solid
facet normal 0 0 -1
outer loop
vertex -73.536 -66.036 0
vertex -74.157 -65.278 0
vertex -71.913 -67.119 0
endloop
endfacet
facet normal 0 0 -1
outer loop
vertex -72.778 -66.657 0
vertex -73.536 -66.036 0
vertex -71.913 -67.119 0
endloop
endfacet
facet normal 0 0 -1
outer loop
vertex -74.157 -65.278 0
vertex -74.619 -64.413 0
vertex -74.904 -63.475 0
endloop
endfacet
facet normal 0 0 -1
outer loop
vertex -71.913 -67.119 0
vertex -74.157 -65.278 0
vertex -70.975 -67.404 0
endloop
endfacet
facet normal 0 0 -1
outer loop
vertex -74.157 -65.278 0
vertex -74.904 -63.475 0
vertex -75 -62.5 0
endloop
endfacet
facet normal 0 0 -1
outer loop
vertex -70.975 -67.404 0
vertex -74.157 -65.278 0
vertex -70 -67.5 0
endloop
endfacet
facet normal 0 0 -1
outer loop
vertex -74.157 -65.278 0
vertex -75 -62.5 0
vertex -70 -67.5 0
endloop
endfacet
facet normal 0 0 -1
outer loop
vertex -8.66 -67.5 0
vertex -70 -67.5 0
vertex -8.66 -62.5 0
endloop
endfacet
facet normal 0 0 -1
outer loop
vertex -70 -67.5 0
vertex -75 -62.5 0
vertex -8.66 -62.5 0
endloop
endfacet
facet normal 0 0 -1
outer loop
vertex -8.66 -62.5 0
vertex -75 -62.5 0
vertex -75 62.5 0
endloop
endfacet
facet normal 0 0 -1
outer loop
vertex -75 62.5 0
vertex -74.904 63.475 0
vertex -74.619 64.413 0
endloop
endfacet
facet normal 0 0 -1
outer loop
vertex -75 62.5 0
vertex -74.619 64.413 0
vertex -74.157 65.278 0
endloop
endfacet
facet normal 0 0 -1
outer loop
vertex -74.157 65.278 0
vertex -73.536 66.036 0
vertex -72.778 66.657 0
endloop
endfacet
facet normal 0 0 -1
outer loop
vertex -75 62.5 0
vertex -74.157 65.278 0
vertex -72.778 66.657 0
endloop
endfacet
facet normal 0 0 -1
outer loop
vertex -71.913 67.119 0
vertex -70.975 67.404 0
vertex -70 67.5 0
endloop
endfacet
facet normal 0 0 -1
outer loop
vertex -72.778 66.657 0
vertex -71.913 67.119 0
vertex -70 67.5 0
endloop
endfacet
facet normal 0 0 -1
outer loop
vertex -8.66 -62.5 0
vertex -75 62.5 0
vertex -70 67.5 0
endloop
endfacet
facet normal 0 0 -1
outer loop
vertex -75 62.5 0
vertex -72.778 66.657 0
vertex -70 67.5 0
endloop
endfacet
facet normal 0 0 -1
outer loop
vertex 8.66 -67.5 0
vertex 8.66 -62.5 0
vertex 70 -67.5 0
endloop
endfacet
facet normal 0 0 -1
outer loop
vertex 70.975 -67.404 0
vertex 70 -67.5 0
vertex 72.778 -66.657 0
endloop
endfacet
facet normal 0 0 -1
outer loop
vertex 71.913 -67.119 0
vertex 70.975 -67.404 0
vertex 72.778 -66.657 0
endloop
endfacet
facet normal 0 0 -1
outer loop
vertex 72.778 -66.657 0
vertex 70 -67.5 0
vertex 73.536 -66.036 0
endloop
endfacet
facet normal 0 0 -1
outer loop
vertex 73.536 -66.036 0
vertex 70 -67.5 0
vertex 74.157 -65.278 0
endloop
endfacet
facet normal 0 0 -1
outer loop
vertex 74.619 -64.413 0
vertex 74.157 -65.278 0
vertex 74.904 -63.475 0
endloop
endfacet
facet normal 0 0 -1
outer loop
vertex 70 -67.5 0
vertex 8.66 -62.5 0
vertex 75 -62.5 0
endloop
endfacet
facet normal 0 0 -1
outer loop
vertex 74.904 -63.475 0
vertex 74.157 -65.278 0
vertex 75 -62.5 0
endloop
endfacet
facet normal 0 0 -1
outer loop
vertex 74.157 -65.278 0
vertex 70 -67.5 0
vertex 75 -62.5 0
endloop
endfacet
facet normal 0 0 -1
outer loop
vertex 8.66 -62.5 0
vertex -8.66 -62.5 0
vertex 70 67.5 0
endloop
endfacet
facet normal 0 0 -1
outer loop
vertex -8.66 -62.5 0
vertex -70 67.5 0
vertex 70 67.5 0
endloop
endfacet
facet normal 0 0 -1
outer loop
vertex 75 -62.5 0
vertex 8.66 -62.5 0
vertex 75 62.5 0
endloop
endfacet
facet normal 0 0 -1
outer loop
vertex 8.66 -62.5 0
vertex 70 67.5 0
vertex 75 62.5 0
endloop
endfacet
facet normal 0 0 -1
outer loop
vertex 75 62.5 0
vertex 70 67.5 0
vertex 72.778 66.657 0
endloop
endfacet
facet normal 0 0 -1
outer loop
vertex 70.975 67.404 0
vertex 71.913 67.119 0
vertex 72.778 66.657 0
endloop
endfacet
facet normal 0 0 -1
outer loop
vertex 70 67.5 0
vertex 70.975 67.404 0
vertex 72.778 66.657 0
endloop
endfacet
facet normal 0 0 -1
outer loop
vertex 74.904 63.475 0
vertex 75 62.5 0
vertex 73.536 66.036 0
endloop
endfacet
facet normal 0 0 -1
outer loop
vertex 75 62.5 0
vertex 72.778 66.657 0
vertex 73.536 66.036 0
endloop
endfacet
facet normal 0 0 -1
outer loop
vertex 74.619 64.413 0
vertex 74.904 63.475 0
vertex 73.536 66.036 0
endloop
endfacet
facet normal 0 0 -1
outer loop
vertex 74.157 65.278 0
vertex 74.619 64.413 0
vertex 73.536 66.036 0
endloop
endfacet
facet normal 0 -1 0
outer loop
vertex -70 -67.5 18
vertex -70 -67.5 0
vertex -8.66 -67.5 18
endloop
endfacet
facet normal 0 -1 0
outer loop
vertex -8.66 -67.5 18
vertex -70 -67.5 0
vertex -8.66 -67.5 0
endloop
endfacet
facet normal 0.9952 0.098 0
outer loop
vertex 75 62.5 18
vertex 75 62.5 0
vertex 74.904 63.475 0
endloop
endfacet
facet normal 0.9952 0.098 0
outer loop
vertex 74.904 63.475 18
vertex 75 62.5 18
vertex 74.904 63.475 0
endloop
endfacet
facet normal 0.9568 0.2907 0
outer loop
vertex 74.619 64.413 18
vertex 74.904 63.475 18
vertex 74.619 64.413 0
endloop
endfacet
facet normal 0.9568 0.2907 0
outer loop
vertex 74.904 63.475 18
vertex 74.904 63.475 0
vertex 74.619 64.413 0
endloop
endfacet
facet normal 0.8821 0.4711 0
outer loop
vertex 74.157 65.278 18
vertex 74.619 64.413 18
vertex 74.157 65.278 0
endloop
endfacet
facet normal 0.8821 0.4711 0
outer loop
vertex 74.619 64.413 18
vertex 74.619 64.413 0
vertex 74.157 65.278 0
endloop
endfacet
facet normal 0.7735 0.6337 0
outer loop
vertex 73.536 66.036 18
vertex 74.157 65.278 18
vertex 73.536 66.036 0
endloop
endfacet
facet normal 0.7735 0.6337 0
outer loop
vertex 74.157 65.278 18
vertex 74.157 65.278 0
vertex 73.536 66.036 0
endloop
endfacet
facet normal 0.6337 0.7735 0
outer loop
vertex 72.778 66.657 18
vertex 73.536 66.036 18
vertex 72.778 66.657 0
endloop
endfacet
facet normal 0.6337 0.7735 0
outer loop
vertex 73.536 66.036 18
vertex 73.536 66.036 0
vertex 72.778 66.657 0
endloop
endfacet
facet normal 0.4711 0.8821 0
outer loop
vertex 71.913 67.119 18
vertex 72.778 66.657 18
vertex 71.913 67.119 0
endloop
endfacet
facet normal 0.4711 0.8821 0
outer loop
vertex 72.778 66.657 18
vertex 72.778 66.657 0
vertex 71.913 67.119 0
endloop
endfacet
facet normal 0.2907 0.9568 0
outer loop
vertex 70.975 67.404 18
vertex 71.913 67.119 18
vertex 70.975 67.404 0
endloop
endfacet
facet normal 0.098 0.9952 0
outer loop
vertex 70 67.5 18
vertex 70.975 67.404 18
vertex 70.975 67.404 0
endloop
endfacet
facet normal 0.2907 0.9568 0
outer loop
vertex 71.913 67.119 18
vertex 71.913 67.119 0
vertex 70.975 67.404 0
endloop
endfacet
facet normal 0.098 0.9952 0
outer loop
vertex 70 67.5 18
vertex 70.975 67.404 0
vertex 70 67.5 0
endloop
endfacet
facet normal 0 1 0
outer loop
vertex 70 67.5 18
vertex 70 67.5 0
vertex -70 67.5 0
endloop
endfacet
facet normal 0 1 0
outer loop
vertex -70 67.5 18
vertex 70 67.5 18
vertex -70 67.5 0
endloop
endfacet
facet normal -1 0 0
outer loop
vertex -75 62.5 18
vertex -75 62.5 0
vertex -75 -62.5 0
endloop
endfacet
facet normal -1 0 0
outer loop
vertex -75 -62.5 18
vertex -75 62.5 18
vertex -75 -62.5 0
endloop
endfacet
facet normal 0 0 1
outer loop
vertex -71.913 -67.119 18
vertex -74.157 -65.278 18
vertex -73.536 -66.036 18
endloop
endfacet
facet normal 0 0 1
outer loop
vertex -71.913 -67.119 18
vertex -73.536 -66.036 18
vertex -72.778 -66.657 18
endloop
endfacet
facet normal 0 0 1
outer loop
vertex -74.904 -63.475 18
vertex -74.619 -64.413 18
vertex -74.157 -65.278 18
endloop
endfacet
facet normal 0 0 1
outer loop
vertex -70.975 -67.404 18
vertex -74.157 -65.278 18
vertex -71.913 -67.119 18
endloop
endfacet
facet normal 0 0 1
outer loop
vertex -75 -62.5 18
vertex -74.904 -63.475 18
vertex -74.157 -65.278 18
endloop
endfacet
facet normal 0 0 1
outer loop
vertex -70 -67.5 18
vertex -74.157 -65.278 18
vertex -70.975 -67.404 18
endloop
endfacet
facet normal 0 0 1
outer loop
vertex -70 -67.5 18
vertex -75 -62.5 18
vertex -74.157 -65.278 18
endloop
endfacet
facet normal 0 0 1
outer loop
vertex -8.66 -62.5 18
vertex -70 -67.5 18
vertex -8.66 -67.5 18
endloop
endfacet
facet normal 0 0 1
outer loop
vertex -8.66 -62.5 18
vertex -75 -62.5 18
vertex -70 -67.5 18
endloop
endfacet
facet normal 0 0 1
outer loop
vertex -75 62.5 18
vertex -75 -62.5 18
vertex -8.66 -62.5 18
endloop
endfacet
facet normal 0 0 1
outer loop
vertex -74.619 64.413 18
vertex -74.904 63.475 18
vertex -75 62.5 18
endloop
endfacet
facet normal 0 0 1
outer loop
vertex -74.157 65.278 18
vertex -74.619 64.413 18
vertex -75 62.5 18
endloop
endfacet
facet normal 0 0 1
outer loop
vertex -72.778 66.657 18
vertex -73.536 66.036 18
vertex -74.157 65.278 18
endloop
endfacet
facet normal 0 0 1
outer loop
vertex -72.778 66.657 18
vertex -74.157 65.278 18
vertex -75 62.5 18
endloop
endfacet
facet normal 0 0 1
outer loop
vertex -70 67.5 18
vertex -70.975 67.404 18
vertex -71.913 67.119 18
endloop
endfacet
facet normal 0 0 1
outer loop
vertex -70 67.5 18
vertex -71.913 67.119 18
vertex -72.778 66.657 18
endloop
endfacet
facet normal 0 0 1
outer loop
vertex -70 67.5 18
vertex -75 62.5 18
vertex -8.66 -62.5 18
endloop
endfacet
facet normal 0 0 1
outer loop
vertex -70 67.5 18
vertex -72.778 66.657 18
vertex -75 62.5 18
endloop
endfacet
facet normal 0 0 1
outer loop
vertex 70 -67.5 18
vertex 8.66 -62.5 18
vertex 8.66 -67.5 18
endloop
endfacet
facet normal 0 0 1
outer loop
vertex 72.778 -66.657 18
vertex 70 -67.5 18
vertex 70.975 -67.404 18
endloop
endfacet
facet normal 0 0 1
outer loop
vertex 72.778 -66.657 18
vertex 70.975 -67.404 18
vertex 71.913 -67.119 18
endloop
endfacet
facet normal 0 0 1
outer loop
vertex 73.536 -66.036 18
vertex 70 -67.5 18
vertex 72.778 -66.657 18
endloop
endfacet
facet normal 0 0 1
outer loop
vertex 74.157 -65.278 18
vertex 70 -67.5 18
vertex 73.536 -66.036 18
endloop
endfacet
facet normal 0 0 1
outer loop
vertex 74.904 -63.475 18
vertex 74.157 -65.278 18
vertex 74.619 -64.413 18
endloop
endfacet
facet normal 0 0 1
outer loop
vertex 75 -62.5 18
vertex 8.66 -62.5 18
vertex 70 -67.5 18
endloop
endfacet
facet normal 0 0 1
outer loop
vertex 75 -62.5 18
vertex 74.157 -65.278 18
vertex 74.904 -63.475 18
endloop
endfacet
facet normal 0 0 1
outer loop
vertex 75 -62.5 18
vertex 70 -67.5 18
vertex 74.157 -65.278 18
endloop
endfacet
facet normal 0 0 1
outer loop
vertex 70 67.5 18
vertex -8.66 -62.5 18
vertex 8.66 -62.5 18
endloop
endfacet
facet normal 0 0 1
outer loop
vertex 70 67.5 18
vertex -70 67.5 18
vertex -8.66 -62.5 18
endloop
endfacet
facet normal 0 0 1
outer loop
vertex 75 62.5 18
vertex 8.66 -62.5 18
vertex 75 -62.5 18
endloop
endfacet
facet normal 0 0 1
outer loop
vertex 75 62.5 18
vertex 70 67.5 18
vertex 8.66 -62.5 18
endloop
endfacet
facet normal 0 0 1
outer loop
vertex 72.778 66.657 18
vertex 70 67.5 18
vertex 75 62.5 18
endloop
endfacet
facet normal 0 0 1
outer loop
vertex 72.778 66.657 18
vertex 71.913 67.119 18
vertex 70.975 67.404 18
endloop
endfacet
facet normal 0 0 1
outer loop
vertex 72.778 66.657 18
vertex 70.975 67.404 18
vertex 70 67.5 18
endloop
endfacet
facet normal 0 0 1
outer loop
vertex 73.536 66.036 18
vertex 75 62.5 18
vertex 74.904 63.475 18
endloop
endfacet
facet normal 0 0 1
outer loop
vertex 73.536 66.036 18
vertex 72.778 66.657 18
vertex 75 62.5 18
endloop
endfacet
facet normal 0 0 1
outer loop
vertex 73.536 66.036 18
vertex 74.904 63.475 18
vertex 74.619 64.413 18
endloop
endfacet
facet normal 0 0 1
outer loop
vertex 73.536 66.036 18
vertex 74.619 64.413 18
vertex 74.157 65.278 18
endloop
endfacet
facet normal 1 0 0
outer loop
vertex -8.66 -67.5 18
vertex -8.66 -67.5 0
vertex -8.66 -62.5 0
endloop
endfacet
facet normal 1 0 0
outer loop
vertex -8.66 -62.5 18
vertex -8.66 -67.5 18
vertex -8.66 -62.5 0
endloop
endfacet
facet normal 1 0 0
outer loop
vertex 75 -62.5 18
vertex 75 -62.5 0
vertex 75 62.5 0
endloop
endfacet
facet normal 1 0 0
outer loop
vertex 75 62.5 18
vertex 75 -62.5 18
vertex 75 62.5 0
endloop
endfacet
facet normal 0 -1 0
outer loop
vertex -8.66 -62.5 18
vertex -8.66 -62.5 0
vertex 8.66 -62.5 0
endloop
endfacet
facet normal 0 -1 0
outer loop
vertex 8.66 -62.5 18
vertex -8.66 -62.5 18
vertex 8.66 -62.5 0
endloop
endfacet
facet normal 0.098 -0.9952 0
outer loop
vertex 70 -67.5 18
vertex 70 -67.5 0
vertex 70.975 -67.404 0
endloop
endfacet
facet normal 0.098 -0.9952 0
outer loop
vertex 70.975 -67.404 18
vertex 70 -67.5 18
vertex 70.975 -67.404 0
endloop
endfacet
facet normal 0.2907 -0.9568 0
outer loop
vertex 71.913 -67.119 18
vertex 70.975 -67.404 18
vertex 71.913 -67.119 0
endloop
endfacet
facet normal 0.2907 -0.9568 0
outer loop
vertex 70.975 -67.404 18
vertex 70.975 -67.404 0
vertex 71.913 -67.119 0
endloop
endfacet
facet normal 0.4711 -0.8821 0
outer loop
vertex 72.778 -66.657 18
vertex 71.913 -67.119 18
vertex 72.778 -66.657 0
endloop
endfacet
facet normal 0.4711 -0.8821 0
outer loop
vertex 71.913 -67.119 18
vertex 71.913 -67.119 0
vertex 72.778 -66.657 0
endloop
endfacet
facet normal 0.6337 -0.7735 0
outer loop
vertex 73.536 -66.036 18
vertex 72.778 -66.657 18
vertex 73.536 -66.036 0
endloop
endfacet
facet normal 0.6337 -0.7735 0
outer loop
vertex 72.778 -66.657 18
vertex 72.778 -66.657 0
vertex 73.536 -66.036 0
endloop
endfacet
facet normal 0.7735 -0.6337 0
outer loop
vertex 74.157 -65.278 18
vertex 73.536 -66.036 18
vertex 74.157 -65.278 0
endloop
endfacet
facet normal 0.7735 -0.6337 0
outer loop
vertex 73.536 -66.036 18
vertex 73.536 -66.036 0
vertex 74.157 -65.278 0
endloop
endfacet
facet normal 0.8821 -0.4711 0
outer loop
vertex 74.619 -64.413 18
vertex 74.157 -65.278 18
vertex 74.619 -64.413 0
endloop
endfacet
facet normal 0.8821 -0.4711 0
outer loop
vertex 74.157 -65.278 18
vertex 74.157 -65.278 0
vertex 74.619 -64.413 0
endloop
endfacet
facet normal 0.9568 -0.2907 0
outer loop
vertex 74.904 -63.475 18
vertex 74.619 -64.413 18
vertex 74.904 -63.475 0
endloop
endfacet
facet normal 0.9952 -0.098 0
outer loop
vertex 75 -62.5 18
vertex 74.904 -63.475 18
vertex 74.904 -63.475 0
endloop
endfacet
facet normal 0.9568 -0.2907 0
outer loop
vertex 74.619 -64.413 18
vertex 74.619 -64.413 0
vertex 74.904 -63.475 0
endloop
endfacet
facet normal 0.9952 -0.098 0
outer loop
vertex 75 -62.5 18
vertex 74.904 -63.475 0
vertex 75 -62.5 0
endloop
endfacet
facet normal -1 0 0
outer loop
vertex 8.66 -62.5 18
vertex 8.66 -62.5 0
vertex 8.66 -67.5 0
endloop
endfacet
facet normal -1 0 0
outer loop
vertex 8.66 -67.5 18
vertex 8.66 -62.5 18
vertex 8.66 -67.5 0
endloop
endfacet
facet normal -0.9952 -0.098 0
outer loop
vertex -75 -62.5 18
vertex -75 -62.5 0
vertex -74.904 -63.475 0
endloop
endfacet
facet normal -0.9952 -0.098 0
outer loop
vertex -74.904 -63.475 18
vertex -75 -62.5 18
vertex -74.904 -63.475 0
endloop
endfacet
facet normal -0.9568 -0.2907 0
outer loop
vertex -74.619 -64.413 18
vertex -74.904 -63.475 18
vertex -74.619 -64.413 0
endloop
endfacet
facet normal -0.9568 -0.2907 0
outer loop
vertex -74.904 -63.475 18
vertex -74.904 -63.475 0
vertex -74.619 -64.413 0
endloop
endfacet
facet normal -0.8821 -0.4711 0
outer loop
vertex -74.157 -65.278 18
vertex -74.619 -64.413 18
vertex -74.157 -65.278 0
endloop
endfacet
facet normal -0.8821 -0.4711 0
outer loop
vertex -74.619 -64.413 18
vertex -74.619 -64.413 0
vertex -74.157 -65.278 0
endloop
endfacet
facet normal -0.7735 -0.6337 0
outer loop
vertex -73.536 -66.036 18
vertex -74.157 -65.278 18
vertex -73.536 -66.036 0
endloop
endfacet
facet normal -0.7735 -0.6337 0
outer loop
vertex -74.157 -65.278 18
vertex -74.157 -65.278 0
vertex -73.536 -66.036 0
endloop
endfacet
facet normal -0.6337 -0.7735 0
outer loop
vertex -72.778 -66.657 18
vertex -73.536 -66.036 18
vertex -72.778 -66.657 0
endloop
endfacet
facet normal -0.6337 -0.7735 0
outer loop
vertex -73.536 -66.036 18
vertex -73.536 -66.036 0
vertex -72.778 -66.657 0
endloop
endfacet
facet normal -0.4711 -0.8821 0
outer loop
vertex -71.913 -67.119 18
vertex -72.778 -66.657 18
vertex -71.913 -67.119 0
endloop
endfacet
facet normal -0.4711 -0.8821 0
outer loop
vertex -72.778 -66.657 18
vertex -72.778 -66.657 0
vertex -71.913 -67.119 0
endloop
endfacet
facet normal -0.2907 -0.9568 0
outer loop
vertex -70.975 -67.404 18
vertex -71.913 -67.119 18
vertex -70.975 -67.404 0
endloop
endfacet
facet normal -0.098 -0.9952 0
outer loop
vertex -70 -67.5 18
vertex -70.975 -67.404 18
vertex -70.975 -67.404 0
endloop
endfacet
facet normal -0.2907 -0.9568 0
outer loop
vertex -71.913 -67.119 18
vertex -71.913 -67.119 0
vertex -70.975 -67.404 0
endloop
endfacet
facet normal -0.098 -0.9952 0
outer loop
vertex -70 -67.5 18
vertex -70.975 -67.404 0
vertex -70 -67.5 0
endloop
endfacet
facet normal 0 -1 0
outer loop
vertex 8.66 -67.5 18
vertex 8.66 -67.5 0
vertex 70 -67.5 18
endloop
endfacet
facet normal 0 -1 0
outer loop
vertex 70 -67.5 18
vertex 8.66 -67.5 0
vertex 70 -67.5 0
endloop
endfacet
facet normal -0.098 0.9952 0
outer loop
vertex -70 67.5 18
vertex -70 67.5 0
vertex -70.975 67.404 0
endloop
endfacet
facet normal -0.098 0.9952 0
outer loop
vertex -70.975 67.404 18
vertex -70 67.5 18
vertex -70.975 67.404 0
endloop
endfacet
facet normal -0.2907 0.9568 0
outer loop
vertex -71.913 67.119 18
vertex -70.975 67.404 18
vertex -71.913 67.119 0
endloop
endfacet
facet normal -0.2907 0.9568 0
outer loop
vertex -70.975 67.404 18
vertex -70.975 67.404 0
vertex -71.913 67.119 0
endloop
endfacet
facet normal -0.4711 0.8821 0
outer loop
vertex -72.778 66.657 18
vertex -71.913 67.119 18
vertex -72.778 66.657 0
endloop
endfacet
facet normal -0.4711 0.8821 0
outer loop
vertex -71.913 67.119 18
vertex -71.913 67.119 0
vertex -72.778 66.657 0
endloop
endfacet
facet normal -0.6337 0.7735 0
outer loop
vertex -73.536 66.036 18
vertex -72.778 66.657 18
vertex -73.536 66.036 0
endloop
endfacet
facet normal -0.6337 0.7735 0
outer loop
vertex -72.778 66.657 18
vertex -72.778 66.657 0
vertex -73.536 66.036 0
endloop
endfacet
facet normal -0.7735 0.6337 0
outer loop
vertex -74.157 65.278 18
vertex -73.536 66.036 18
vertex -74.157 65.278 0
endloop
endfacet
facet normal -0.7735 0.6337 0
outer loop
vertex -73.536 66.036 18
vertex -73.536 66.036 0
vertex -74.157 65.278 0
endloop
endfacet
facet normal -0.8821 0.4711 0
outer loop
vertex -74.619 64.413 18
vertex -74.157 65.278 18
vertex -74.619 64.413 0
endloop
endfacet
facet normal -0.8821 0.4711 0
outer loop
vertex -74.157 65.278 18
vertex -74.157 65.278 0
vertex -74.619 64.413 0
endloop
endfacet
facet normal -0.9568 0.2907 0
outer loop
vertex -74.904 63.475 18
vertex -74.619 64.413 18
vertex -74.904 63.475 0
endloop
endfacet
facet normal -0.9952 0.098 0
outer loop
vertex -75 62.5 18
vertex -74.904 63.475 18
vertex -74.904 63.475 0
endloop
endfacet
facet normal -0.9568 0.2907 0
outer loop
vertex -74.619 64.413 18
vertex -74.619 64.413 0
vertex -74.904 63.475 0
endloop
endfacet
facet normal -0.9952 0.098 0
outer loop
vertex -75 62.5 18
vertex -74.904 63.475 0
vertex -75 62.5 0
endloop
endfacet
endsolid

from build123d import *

# Parameters (mm, degrees)
EXTRUDE_1_DEPTH = 18


with BuildPart() as part:
    # 草图1 → 凸台-拉伸1 (new body)
    with BuildSketch(Plane.XY):
        with BuildLine():
            Line((-70, -67.5), (-8.660254038, -67.5))
            Line((-8.660254038, -67.5), (-8.660254038, -62.5))
            Line((-8.660254038, -62.5), (8.660254038, -62.5))
            Line((8.660254038, -62.5), (8.660254038, -67.5))
            Line((8.660254038, -67.5), (70, -67.5))
            ThreePointArc((70, -67.5), (73.535533906, -66.035533906), (75, -62.5))
            Line((75, -62.5), (75, 62.5))
            ThreePointArc((75, 62.5), (73.535533906, 66.035533906), (70, 67.5))
            Line((70, 67.5), (-70, 67.5))
            ThreePointArc((-70, 67.5), (-73.535533906, 66.035533906), (-75, 62.5))
            Line((-75, 62.5), (-75, -62.5))
            ThreePointArc((-75, -62.5), (-73.535533906, -66.035533906), (-70, -67.5))
        make_face()
    extrude(amount=EXTRUDE_1_DEPTH)


solid = part.part
